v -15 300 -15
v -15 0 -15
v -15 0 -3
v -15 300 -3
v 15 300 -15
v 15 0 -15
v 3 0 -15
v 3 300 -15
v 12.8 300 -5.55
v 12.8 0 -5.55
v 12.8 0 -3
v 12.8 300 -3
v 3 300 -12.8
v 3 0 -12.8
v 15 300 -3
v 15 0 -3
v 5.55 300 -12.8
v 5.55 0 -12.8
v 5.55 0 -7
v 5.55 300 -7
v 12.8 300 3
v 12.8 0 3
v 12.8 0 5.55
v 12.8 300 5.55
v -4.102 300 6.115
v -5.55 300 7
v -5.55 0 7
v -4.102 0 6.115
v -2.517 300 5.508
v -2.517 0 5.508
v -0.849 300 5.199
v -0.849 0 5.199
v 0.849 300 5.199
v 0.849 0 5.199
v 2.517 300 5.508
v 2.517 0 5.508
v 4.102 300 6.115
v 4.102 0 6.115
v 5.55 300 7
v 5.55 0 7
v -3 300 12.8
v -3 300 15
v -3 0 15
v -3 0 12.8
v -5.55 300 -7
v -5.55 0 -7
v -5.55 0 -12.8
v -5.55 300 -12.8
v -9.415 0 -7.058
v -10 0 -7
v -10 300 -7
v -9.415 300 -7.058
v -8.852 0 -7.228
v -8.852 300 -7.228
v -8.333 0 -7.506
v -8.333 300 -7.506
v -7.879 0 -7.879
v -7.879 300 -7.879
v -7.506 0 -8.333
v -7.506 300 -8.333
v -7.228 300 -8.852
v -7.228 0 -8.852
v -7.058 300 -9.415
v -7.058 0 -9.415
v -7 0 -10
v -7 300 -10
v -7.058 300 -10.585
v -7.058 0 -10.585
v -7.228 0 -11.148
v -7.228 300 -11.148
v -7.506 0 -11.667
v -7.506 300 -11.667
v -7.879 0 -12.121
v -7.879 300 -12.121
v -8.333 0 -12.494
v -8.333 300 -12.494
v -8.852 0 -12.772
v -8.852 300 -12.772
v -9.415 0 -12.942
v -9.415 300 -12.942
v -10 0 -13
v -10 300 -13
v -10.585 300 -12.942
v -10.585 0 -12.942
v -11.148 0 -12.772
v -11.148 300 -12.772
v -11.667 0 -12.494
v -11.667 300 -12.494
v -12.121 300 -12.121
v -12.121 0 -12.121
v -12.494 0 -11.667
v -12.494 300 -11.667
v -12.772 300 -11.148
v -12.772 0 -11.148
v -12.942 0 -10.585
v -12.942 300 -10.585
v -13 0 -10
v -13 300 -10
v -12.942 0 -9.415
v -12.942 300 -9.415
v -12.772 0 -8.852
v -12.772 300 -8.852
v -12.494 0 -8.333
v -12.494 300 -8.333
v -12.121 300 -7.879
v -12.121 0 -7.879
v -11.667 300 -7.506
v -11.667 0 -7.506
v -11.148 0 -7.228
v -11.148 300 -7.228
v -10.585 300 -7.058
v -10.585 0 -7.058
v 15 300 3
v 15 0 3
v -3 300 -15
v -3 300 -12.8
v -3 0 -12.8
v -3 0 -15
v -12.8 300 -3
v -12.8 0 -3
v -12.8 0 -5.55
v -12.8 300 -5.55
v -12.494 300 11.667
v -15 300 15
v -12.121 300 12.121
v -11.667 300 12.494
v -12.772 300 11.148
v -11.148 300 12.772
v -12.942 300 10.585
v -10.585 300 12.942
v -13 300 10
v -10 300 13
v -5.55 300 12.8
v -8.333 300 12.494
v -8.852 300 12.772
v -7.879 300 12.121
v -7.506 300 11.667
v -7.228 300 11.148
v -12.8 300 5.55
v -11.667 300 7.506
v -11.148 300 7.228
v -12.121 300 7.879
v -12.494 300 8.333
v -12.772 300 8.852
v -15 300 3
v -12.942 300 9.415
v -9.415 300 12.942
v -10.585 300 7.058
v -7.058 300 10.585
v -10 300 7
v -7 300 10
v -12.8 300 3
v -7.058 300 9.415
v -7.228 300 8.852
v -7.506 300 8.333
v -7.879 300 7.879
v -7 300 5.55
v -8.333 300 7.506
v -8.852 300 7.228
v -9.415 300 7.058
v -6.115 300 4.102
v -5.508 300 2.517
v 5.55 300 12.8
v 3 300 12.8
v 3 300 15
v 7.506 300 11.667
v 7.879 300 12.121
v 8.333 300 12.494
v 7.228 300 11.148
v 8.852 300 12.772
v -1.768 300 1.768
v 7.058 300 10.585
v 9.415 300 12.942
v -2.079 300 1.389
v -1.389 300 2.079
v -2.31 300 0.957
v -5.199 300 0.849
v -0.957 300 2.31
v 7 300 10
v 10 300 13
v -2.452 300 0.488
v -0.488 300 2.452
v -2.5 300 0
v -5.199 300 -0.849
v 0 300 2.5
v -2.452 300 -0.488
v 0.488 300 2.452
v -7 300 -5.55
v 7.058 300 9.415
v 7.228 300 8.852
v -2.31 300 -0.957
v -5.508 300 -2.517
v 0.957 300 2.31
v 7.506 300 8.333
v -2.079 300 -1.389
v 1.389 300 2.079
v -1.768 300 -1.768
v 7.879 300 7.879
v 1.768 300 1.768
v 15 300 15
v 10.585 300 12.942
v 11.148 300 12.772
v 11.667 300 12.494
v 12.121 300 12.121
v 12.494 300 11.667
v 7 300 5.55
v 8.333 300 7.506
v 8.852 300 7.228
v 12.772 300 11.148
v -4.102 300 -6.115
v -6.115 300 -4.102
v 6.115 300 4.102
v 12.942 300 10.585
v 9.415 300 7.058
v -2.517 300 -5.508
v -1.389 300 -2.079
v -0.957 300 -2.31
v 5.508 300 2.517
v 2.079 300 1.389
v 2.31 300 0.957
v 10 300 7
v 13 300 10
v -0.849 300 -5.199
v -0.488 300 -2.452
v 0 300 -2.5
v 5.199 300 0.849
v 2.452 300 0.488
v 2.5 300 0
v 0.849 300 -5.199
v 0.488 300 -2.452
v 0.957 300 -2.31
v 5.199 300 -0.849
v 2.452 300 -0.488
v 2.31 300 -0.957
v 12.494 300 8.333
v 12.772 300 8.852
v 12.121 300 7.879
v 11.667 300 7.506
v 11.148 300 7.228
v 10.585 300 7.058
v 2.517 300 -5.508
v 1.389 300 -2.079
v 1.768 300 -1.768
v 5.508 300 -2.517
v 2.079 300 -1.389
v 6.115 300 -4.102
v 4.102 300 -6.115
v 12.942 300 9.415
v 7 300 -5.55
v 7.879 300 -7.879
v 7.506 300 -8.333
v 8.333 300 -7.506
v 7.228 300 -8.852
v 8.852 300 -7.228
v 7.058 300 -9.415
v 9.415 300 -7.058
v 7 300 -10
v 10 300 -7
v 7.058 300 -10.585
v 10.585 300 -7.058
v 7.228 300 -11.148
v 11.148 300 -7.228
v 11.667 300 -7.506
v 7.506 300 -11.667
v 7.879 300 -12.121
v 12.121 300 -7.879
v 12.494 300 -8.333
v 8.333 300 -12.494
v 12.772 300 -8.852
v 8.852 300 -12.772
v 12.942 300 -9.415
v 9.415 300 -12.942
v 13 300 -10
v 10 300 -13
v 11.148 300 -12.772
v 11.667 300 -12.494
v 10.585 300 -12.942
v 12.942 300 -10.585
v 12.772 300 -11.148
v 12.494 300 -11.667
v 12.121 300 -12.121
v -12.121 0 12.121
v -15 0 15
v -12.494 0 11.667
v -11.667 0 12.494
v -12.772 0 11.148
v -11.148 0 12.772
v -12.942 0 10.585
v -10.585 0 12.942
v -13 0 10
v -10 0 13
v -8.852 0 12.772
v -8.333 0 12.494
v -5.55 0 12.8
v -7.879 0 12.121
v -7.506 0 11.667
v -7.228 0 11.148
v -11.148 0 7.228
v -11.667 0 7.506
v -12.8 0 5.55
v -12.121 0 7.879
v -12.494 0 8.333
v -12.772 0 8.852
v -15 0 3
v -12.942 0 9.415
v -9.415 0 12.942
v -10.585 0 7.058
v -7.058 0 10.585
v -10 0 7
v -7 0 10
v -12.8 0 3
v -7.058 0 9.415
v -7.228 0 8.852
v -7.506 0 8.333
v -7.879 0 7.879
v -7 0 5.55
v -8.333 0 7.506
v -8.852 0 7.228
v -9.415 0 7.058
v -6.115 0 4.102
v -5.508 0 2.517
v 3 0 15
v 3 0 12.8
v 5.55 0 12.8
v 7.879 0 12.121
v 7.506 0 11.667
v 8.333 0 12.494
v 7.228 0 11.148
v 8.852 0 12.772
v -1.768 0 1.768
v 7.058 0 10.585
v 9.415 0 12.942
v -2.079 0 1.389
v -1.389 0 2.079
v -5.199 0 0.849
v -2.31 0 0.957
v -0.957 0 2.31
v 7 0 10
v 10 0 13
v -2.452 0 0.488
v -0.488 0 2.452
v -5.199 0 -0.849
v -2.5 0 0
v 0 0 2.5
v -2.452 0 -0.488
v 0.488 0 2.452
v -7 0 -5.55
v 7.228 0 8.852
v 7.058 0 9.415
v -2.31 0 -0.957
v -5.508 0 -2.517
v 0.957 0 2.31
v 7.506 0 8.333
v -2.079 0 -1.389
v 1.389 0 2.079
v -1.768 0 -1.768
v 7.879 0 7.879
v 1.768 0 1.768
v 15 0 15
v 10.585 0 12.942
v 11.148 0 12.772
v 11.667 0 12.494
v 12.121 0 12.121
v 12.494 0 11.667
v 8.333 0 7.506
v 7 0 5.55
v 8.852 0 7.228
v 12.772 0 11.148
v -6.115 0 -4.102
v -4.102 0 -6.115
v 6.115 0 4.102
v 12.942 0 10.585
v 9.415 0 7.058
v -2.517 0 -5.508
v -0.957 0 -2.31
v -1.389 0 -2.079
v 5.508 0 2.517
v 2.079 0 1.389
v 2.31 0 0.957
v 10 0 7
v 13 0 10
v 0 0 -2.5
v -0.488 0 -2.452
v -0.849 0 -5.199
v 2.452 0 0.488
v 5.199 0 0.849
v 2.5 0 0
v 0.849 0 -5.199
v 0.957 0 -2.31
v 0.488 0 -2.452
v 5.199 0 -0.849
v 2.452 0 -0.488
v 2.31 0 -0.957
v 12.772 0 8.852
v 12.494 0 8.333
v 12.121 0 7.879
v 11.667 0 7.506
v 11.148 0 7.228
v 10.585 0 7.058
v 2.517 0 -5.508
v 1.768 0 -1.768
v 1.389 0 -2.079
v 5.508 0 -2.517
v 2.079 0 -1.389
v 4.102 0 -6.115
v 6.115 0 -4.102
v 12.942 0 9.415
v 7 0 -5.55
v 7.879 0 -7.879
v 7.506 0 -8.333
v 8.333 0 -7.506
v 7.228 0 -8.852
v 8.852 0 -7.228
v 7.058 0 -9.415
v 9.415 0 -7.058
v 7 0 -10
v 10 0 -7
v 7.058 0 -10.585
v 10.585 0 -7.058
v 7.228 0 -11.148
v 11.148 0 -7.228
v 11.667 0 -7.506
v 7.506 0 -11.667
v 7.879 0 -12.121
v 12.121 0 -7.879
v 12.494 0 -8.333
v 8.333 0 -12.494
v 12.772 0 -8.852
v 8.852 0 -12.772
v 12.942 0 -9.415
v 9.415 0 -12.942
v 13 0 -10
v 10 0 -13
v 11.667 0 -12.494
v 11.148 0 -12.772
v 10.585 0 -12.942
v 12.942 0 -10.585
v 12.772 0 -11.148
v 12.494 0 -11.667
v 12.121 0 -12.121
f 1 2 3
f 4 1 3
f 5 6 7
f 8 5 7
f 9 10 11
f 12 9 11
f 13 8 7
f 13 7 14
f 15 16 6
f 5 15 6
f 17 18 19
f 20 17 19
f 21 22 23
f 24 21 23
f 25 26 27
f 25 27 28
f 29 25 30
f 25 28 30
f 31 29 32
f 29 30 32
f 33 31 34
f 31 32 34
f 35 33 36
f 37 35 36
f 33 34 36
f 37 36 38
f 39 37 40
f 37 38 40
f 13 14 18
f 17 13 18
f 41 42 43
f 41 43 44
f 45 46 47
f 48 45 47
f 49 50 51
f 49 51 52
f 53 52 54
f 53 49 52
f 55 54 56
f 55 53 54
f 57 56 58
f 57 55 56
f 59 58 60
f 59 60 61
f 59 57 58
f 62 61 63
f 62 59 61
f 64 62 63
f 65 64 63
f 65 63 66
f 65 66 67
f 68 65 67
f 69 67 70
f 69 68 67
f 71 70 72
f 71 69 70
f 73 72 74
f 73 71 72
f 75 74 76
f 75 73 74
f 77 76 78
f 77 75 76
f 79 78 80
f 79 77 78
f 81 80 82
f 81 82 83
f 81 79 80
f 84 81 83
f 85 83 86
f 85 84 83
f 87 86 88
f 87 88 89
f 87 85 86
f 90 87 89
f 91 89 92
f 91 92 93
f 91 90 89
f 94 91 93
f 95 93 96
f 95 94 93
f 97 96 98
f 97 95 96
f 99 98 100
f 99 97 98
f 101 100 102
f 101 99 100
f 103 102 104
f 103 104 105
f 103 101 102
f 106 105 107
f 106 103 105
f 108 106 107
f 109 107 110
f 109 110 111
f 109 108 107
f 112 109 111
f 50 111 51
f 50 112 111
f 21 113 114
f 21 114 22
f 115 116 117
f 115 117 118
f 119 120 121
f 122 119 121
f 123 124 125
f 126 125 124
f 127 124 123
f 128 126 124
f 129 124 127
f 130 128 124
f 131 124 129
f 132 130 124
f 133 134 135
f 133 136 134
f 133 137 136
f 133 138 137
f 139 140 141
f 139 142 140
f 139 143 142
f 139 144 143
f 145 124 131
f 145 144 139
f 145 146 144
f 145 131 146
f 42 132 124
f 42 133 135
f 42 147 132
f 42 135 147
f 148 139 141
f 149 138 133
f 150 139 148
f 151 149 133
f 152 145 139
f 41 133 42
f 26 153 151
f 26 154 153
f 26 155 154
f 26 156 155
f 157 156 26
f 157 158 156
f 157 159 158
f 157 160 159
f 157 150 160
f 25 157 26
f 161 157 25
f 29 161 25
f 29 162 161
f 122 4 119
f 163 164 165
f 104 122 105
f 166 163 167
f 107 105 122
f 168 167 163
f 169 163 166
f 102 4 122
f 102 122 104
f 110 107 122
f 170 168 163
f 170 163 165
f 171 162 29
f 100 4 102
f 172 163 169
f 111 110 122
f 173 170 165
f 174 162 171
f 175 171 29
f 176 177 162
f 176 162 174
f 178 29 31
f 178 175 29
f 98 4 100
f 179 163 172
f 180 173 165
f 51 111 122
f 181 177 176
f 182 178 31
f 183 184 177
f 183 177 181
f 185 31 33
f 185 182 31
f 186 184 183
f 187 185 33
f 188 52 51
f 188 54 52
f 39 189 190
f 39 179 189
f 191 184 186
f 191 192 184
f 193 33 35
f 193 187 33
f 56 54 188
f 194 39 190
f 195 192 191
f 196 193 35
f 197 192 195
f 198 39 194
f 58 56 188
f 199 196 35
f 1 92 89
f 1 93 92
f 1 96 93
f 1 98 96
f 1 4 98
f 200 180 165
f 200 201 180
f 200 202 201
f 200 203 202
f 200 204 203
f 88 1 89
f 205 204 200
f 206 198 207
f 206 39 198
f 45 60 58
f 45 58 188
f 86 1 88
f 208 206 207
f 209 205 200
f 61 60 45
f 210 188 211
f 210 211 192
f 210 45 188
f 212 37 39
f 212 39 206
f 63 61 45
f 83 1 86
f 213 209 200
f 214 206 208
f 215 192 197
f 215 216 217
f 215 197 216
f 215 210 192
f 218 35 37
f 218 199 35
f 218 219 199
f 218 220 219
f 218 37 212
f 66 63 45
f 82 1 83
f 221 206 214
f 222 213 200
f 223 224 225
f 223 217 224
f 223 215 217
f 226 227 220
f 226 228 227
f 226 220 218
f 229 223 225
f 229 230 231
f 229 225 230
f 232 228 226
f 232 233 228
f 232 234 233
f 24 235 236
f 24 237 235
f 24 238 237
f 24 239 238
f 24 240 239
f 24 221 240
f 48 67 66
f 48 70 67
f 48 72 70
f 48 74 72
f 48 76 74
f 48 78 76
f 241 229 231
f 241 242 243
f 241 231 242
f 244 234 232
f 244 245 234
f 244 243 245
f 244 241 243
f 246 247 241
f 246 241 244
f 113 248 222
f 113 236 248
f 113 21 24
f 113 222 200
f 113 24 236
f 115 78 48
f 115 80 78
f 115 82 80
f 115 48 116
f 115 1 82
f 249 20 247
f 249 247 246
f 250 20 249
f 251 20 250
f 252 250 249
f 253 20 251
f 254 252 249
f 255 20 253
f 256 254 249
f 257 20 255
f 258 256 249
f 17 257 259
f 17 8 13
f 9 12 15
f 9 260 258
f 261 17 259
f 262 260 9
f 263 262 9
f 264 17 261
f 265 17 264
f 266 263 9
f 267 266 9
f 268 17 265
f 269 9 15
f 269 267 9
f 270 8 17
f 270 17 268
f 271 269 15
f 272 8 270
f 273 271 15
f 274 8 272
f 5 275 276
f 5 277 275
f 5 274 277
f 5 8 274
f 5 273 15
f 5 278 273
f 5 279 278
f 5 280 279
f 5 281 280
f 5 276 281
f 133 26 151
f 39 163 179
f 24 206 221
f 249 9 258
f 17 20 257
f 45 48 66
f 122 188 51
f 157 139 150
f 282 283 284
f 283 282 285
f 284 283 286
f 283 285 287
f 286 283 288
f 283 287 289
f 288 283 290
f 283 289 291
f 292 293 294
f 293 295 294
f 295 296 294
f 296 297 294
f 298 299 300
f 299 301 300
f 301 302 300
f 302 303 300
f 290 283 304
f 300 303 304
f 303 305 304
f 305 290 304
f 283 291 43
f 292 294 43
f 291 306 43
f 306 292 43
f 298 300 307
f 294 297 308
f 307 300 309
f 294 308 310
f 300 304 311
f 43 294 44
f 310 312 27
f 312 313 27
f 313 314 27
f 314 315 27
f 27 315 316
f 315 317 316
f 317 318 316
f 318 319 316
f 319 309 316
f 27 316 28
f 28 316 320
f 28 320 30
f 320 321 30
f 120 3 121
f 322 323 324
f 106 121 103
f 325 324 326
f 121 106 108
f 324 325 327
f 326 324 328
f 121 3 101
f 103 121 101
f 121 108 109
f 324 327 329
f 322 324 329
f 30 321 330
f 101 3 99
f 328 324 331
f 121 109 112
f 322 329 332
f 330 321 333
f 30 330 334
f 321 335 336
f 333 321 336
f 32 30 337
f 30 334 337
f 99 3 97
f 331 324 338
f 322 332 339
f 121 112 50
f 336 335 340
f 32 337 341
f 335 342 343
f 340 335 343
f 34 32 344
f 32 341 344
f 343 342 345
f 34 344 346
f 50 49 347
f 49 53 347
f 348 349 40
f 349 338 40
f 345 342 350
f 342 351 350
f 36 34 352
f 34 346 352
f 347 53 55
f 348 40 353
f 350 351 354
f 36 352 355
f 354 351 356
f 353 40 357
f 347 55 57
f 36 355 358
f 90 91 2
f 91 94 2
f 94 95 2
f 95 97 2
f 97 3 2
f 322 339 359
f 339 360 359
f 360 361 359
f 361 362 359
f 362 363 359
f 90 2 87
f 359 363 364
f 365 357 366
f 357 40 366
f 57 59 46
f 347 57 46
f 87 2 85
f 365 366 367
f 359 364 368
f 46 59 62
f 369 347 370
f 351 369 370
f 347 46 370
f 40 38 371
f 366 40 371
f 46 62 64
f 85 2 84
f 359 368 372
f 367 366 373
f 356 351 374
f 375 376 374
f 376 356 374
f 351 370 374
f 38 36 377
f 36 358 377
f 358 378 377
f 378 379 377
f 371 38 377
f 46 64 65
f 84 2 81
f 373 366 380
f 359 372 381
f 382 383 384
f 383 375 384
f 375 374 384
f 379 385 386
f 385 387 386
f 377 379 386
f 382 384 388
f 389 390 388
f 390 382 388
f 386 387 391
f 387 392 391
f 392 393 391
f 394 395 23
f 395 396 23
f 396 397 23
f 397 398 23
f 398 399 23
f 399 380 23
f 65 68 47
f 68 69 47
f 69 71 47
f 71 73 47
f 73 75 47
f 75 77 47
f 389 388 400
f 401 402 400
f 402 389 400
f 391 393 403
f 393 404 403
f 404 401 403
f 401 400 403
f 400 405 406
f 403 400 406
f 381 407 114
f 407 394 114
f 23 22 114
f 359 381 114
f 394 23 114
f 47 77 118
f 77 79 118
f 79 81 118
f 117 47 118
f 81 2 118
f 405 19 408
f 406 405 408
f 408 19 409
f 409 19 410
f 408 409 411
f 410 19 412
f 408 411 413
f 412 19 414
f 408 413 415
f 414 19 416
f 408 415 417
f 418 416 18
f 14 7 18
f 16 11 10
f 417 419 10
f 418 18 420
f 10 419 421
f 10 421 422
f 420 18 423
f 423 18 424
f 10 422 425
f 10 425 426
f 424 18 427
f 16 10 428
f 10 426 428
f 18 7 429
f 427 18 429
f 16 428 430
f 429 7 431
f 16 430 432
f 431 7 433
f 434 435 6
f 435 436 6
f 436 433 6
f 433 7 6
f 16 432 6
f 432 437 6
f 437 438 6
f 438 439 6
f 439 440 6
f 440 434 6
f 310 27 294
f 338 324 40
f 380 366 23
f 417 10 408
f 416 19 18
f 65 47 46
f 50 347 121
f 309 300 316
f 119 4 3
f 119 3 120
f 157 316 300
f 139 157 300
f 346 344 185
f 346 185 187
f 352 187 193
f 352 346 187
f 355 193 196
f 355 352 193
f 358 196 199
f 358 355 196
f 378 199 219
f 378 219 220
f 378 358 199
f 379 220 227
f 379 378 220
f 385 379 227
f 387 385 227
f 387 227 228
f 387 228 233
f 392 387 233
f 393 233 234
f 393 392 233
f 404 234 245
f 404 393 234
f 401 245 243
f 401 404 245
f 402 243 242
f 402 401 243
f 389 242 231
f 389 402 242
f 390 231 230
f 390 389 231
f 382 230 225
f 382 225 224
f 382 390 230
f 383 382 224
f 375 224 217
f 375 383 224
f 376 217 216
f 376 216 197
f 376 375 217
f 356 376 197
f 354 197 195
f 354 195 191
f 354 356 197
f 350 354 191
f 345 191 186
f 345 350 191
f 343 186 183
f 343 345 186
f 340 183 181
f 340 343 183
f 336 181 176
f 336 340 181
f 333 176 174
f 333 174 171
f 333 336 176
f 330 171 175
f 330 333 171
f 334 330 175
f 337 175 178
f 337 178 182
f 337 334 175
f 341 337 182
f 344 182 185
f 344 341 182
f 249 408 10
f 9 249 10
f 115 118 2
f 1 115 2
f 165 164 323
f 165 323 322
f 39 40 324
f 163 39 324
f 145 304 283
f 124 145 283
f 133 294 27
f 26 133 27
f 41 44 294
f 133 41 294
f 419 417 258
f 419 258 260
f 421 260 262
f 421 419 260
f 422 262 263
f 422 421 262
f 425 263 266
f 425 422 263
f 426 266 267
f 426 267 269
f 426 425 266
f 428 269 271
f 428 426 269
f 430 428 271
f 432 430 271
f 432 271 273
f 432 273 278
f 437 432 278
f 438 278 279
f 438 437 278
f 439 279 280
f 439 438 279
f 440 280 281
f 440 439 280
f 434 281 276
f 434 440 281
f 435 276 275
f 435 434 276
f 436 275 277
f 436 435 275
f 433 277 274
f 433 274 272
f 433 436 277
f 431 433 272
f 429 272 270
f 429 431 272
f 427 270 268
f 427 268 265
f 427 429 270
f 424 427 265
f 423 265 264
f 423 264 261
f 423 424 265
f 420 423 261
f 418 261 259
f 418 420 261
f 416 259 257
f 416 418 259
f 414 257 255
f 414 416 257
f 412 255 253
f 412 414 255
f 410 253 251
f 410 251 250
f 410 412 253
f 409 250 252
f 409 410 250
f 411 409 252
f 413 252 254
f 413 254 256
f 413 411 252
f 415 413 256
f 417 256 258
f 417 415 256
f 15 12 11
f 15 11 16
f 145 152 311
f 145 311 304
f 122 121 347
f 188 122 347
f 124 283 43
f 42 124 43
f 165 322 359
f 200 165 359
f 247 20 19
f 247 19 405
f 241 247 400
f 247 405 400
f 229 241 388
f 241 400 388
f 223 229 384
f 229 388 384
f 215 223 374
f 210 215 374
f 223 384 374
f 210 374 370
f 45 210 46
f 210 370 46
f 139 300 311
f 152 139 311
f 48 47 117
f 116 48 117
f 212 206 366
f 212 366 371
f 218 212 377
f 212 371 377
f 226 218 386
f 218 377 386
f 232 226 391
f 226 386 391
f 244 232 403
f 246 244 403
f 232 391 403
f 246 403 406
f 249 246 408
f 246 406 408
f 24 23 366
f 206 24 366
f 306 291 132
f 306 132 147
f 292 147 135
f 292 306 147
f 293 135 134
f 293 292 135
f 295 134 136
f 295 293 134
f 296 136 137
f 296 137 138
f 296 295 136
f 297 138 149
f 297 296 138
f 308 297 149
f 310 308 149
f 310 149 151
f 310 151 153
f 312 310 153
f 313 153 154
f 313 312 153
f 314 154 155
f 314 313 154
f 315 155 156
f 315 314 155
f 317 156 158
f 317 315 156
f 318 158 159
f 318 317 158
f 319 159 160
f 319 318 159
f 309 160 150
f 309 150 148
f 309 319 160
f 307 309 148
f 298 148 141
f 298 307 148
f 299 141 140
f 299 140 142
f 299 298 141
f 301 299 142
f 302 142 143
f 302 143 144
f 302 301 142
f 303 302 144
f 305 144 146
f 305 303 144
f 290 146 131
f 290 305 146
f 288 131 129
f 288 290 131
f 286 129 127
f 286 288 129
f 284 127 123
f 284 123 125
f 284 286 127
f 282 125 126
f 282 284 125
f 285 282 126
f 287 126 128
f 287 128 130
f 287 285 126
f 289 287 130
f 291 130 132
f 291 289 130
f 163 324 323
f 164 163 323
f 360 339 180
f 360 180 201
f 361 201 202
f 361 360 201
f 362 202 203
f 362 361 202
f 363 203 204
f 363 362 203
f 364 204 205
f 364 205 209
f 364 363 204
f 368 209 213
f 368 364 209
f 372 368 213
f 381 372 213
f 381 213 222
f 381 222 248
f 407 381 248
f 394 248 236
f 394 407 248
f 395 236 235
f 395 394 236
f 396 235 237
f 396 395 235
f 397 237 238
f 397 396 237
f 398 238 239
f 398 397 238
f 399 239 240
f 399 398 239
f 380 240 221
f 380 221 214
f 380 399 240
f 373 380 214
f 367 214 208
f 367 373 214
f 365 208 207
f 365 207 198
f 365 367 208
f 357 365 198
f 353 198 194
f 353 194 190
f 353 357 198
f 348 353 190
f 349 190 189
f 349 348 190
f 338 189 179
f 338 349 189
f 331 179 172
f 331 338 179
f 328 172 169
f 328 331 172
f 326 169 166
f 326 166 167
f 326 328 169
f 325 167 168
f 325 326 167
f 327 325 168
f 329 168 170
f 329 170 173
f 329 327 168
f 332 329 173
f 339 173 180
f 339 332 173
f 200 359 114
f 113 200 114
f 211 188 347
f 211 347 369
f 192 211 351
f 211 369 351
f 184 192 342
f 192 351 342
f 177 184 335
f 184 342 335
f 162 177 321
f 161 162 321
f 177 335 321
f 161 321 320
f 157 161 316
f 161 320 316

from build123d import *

# Parameters (mm, degrees)
SKETCH1_R           = 3
SKETCH1_R_2         = 2.5
BOSS_EXTRUDE1_DEPTH = 300


with BuildPart() as part:
    # Sketch1 → Boss-Extrude1 (new body)
    with BuildSketch(Plane(origin=(0, 0, 0), x_dir=(1, 0, 0), z_dir=(0, 1, 0))):
        with BuildLine():
            Line((-3, -15), (-3, -12.8))
            Line((-3, -12.8), (-5.55, -12.8))
            Line((-5.55, -12.8), (-5.55, -7))
            ThreePointArc((-5.55, -7), (0, -5.16), (5.55, -7))
            Line((5.55, -7), (5.55, -12.8))
            Line((5.55, -12.8), (3, -12.8))
            Line((3, -12.8), (3, -15))
            Line((3, -15), (15, -15))
            Line((15, -15), (15, -3))
            Line((15, -3), (12.8, -3))
            Line((12.8, -3), (12.8, -5.55))
            Line((12.8, -5.55), (7, -5.55))
            ThreePointArc((7, -5.55), (5.16, 0), (7, 5.55))
            Line((7, 5.55), (12.8, 5.55))
            Line((12.8, 5.55), (12.8, 3))
            Line((12.8, 3), (15, 3))
            Line((15, 3), (15, 15))
            Line((15, 15), (3, 15))
            Line((3, 15), (3, 12.8))
            Line((3, 12.8), (5.55, 12.8))
            Line((5.55, 12.8), (5.55, 7))
            ThreePointArc((5.55, 7), (0, 5.16), (-5.55, 7))
            Line((-5.55, 7), (-5.55, 12.8))
            Line((-5.55, 12.8), (-3, 12.8))
            Line((-3, 12.8), (-3, 15))
            Line((-3, 15), (-15, 15))
            Line((-15, 15), (-15, 3))
            Line((-15, 3), (-12.8, 3))
            Line((-12.8, 3), (-12.8, 5.55))
            Line((-12.8, 5.55), (-7, 5.55))
            ThreePointArc((-7, 5.55), (-5.16, 0), (-7, -5.55))
            Line((-7, -5.55), (-12.8, -5.55))
            Line((-12.8, -5.55), (-12.8, -3))
            Line((-12.8, -3), (-15, -3))
            Line((-15, -3), (-15, -15))
            Line((-15, -15), (-3, -15))
        make_face()
        with Locations(Location((-10, 10, 0), (0, 0, 270))):
            Circle(SKETCH1_R, mode=Mode.SUBTRACT)
        with Locations(Location((10, 10, 0), (0, 0, 270))):
            Circle(SKETCH1_R, mode=Mode.SUBTRACT)
        with Locations(Location((-10, -10, 0), (0, 0, 270))):
            Circle(SKETCH1_R, mode=Mode.SUBTRACT)
        with Locations(Location((10, -10, 0), (0, 0, 270))):
            Circle(SKETCH1_R, mode=Mode.SUBTRACT)
        with Locations(Location((0, 0, 0), (0, 0, 270))):
            Circle(SKETCH1_R_2, mode=Mode.SUBTRACT)
    extrude(amount=BOSS_EXTRUDE1_DEPTH)


solid = part.part
